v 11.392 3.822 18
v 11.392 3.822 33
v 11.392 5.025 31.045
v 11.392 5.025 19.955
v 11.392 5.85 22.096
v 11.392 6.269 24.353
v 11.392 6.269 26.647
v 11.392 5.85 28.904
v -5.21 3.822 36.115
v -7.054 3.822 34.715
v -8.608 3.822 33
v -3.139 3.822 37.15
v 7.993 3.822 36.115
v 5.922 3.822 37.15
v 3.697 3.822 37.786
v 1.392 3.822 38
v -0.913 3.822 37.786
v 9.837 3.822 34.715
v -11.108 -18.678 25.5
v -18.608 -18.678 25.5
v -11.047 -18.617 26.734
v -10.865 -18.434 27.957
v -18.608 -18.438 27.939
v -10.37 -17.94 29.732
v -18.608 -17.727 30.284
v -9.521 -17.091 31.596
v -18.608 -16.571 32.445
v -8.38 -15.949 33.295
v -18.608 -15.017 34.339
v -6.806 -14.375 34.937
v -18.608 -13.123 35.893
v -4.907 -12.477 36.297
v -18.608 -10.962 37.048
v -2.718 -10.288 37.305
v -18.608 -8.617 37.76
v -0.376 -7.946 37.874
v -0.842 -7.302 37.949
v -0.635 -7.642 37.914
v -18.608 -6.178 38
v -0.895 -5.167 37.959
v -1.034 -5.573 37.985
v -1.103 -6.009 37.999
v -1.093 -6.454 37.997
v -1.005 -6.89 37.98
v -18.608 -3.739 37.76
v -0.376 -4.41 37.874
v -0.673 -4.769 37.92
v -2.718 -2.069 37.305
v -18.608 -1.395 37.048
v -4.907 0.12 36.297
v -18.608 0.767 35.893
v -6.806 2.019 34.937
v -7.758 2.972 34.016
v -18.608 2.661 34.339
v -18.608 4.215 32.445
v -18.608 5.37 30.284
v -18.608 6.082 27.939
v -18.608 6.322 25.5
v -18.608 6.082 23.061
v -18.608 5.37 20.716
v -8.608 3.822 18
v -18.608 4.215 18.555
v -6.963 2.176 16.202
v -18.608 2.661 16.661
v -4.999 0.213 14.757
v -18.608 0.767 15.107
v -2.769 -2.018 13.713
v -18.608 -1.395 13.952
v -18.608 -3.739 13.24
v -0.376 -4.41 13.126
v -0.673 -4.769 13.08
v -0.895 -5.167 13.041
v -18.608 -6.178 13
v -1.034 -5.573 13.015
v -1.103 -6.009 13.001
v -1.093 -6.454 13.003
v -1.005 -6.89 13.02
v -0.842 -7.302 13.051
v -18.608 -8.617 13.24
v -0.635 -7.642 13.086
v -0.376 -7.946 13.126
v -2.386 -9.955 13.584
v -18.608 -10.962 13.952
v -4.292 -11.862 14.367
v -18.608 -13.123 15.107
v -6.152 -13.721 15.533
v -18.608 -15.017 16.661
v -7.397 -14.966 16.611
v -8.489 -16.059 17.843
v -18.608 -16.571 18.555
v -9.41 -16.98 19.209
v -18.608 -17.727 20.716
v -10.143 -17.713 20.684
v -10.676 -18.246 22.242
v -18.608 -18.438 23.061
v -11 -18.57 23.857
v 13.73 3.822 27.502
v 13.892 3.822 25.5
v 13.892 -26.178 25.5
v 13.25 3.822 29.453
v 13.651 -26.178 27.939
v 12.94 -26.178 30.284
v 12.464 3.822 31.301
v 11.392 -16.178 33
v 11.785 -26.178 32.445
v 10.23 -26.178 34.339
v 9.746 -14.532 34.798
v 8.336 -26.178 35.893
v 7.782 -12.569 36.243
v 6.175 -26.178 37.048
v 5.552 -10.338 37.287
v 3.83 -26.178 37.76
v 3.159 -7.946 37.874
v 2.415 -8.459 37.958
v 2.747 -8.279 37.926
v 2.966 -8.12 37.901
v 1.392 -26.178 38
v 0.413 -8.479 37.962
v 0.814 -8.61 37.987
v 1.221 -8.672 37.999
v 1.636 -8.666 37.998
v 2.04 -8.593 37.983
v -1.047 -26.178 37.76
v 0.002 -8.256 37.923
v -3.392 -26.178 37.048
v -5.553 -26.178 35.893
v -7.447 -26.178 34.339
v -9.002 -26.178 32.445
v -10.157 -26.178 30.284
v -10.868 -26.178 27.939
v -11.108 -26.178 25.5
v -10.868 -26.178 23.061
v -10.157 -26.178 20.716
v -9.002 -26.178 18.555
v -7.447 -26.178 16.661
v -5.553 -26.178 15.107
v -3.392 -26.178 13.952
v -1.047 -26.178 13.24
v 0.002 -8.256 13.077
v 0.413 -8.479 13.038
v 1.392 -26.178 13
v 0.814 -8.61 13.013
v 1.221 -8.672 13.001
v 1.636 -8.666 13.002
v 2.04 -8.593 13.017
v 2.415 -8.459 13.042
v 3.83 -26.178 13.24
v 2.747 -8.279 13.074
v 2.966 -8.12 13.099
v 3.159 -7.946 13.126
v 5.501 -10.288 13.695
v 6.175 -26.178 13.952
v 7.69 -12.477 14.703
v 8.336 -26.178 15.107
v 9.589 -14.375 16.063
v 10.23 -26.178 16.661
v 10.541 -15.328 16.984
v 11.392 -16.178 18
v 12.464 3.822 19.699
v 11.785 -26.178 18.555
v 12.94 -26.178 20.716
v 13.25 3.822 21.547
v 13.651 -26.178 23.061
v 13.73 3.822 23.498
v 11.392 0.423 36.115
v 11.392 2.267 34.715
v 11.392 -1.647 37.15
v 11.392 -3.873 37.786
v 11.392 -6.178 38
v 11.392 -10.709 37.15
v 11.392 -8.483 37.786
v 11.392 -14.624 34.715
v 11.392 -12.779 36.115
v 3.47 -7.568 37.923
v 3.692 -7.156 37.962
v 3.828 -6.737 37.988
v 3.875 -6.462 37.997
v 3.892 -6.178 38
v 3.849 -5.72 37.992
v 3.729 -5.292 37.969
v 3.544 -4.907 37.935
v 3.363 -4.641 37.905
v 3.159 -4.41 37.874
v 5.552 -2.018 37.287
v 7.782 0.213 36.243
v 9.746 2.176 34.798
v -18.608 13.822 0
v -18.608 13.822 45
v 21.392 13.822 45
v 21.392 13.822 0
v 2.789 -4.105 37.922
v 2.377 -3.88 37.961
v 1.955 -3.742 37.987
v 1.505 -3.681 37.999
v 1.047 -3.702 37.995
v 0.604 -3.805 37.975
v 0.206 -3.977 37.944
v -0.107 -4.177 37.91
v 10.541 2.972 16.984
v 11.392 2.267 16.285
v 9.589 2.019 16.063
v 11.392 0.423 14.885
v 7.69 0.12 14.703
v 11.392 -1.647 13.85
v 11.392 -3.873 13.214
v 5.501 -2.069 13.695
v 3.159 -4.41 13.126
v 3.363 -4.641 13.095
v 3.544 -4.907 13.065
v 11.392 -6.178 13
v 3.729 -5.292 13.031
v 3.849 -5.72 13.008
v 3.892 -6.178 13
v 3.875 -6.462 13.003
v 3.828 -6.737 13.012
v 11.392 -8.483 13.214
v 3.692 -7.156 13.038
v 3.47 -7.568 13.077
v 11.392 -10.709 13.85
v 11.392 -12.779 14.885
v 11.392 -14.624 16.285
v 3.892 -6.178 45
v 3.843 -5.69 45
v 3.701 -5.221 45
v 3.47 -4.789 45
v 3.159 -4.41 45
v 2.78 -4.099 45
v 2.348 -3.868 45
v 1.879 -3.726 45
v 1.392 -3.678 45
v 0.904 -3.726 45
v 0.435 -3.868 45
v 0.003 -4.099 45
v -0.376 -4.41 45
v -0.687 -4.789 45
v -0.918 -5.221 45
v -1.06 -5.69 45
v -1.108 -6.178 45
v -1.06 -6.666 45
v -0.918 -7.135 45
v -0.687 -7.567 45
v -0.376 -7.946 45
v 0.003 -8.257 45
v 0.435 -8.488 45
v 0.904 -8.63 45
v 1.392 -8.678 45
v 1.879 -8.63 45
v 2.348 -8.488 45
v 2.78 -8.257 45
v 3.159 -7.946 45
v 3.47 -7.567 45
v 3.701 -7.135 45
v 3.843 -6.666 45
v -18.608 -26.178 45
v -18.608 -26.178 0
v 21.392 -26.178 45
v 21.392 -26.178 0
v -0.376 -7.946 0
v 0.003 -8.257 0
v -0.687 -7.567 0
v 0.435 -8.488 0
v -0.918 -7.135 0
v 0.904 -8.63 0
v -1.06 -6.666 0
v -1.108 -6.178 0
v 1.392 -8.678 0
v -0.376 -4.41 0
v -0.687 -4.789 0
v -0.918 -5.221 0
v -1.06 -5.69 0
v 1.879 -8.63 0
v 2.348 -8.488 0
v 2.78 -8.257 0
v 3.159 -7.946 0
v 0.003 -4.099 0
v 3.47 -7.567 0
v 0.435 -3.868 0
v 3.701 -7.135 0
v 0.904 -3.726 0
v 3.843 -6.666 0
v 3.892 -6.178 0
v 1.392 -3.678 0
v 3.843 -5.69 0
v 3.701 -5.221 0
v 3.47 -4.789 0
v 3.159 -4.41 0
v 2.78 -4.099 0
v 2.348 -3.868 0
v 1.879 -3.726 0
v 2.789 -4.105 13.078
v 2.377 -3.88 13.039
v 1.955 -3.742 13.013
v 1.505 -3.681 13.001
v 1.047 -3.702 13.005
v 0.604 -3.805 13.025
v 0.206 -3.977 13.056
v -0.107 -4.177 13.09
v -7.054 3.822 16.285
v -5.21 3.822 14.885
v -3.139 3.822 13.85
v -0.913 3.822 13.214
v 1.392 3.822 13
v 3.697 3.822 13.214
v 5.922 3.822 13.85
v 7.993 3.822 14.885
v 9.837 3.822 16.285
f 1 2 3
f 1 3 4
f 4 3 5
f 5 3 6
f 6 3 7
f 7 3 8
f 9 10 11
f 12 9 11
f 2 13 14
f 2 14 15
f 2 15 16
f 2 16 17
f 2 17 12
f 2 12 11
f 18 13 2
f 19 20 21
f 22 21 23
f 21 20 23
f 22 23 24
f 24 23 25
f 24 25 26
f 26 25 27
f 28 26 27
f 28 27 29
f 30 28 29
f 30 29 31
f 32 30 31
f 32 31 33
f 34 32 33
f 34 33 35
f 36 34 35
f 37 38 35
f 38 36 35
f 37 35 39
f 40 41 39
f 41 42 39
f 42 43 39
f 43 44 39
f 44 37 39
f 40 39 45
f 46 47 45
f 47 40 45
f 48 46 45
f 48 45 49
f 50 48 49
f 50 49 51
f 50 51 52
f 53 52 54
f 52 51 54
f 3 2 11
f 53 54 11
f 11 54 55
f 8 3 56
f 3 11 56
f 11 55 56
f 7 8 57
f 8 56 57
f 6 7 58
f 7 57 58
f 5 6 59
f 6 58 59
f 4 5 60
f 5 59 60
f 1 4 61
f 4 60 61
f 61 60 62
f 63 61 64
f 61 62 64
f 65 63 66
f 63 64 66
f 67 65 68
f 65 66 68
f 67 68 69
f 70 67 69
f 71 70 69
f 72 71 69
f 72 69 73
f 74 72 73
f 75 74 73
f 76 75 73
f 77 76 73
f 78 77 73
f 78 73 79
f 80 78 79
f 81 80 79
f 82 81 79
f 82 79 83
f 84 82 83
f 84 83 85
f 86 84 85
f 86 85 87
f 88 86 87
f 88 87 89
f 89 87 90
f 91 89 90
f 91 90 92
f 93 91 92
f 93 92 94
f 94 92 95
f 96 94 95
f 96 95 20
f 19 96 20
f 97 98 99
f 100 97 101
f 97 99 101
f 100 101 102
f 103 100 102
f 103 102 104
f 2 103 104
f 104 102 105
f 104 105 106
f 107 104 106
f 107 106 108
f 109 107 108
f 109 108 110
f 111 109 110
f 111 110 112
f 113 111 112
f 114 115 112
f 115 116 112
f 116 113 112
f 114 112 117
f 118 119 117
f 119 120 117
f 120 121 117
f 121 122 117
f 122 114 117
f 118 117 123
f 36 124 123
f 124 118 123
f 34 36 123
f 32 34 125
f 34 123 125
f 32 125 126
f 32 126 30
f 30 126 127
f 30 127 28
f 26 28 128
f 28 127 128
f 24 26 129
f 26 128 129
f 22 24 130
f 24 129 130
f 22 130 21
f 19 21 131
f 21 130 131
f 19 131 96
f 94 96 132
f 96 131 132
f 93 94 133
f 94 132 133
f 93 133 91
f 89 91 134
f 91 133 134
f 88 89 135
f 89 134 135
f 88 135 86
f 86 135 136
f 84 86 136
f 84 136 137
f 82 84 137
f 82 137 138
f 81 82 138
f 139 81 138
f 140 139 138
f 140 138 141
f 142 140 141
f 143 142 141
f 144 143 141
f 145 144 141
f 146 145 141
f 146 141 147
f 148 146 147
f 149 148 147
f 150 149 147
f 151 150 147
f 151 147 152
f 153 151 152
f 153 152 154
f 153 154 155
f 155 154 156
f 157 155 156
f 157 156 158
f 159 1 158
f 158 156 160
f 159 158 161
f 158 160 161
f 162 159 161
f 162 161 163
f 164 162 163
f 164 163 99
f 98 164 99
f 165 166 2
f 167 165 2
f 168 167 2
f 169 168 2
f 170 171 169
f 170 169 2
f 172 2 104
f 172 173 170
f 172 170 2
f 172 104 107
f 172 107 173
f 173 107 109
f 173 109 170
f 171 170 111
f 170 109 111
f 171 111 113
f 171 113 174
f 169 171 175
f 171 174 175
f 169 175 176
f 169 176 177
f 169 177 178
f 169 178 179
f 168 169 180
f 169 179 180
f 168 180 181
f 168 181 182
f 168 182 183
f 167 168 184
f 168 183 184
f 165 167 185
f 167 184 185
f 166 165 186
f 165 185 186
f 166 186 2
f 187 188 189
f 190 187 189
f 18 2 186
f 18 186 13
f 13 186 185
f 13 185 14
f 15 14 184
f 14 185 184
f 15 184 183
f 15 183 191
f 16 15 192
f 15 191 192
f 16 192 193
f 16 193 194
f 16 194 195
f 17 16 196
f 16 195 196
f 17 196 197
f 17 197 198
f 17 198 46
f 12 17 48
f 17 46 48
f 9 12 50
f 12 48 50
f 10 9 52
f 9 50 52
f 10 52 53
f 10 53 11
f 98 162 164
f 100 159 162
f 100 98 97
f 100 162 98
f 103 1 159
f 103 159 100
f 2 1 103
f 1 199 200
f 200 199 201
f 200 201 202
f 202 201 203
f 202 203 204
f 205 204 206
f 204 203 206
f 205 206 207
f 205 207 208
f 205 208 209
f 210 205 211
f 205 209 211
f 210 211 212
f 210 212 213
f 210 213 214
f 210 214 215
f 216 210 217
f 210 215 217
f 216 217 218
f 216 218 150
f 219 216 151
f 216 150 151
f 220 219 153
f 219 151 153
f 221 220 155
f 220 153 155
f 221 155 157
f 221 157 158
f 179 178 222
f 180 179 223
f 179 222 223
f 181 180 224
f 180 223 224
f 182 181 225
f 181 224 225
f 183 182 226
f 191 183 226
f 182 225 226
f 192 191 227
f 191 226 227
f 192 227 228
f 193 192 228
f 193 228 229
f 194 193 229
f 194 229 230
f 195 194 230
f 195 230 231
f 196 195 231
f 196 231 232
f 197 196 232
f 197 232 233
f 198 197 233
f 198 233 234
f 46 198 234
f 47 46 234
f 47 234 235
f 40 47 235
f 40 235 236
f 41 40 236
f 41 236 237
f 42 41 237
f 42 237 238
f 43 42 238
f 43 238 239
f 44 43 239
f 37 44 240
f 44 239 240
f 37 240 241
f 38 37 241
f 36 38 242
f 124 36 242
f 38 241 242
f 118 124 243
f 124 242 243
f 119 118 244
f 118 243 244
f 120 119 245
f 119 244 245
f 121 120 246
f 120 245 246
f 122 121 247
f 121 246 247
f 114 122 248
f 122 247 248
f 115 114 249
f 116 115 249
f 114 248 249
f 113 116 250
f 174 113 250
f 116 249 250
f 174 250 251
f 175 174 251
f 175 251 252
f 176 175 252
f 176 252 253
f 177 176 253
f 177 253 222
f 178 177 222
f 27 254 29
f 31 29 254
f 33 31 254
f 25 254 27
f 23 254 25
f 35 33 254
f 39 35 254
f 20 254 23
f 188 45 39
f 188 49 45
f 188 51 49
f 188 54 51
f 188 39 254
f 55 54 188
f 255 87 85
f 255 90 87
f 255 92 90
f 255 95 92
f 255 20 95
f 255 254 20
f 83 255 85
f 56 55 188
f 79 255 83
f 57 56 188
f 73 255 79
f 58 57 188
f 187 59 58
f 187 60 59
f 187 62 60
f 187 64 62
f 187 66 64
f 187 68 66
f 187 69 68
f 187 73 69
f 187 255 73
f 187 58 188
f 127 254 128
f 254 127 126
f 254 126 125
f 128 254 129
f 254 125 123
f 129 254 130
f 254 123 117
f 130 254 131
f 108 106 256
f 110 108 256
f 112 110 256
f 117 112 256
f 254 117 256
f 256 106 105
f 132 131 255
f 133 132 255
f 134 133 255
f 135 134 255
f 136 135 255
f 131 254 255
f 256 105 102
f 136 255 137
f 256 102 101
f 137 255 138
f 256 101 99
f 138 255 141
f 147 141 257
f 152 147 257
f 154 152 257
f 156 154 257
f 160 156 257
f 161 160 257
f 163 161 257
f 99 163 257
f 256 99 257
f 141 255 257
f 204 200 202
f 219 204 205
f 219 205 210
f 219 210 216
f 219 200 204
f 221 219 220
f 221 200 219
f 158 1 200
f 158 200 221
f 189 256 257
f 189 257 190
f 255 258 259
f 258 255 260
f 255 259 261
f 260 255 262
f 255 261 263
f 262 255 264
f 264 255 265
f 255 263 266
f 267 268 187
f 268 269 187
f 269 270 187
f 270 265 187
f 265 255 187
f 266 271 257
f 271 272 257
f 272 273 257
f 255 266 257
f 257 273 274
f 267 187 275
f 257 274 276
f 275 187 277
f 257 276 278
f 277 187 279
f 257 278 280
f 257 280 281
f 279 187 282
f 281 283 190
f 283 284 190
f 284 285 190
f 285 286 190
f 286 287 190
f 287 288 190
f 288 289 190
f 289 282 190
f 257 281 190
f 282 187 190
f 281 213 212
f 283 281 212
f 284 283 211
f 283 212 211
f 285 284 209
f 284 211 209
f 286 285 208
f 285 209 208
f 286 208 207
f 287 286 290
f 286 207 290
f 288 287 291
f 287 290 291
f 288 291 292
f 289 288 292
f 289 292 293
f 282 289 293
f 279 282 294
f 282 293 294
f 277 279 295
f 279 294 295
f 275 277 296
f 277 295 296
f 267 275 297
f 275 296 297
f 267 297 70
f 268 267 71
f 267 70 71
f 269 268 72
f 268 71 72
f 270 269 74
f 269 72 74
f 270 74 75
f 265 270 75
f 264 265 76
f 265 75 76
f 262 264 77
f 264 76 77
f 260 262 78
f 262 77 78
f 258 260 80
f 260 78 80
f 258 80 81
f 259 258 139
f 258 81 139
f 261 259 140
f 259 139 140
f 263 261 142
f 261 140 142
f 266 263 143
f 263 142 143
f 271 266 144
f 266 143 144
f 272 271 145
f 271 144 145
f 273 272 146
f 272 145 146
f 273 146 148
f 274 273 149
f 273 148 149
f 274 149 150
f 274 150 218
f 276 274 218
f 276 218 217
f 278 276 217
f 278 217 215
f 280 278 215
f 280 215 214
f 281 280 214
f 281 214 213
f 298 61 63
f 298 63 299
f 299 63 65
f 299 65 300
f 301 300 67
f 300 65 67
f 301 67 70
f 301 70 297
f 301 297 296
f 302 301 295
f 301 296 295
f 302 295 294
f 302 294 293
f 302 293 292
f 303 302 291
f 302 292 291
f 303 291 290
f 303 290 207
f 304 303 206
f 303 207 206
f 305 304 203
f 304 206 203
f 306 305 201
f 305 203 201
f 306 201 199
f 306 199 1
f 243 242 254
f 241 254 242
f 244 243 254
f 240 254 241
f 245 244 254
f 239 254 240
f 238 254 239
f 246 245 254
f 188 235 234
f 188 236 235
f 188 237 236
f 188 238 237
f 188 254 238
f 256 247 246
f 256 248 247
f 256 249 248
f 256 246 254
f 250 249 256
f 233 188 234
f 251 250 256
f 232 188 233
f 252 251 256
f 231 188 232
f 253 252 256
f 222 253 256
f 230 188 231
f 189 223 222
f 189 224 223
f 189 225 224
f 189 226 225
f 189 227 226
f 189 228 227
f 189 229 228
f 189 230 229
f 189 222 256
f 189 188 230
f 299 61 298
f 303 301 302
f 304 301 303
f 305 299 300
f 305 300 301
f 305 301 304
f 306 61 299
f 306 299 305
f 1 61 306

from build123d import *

# Parameters (mm, degrees)
F0_W     = 40
F0_H     = 40
F1_DEPTH = 45
F3_R     = 12.5
F4_DEPTH = 30
F2_R     = 12.5
F5_DEPTH = 30
F6_R     = 2.5
F7_DEPTH = 45.001


with BuildPart() as f1:
    # F0 (on Top) → F1 (new body)
    with BuildSketch(Plane.XY):
        with Locations((1.391534, -6.178061)):
            Rectangle(F0_W, F0_H)
    extrude(amount=F1_DEPTH)

    # F3 (on face) → F4 (cut)
    with BuildSketch(Plane.XZ.offset(26.178061)):
        with Locations((1.391534, 25.5)):
            Circle(F3_R)
    extrude(amount=-F4_DEPTH, mode=Mode.SUBTRACT)

    # F2 (on face) → F5 (cut)
    with BuildSketch(Plane(origin=(-18.608466, 0, 0), x_dir=(0, -1, 0), z_dir=(-1, 0, 0))):
        with Locations((6.178061, 25.5)):
            Circle(F2_R)
    extrude(amount=-F5_DEPTH, mode=Mode.SUBTRACT)

    # F6 (on face) → F7 (cut, through all)
    with BuildSketch(Plane.XY.offset(45)):
        with Locations((1.391534, -6.178061)):
            Circle(F6_R)
    extrude(amount=-F7_DEPTH, mode=Mode.SUBTRACT)


solid = f1.part
